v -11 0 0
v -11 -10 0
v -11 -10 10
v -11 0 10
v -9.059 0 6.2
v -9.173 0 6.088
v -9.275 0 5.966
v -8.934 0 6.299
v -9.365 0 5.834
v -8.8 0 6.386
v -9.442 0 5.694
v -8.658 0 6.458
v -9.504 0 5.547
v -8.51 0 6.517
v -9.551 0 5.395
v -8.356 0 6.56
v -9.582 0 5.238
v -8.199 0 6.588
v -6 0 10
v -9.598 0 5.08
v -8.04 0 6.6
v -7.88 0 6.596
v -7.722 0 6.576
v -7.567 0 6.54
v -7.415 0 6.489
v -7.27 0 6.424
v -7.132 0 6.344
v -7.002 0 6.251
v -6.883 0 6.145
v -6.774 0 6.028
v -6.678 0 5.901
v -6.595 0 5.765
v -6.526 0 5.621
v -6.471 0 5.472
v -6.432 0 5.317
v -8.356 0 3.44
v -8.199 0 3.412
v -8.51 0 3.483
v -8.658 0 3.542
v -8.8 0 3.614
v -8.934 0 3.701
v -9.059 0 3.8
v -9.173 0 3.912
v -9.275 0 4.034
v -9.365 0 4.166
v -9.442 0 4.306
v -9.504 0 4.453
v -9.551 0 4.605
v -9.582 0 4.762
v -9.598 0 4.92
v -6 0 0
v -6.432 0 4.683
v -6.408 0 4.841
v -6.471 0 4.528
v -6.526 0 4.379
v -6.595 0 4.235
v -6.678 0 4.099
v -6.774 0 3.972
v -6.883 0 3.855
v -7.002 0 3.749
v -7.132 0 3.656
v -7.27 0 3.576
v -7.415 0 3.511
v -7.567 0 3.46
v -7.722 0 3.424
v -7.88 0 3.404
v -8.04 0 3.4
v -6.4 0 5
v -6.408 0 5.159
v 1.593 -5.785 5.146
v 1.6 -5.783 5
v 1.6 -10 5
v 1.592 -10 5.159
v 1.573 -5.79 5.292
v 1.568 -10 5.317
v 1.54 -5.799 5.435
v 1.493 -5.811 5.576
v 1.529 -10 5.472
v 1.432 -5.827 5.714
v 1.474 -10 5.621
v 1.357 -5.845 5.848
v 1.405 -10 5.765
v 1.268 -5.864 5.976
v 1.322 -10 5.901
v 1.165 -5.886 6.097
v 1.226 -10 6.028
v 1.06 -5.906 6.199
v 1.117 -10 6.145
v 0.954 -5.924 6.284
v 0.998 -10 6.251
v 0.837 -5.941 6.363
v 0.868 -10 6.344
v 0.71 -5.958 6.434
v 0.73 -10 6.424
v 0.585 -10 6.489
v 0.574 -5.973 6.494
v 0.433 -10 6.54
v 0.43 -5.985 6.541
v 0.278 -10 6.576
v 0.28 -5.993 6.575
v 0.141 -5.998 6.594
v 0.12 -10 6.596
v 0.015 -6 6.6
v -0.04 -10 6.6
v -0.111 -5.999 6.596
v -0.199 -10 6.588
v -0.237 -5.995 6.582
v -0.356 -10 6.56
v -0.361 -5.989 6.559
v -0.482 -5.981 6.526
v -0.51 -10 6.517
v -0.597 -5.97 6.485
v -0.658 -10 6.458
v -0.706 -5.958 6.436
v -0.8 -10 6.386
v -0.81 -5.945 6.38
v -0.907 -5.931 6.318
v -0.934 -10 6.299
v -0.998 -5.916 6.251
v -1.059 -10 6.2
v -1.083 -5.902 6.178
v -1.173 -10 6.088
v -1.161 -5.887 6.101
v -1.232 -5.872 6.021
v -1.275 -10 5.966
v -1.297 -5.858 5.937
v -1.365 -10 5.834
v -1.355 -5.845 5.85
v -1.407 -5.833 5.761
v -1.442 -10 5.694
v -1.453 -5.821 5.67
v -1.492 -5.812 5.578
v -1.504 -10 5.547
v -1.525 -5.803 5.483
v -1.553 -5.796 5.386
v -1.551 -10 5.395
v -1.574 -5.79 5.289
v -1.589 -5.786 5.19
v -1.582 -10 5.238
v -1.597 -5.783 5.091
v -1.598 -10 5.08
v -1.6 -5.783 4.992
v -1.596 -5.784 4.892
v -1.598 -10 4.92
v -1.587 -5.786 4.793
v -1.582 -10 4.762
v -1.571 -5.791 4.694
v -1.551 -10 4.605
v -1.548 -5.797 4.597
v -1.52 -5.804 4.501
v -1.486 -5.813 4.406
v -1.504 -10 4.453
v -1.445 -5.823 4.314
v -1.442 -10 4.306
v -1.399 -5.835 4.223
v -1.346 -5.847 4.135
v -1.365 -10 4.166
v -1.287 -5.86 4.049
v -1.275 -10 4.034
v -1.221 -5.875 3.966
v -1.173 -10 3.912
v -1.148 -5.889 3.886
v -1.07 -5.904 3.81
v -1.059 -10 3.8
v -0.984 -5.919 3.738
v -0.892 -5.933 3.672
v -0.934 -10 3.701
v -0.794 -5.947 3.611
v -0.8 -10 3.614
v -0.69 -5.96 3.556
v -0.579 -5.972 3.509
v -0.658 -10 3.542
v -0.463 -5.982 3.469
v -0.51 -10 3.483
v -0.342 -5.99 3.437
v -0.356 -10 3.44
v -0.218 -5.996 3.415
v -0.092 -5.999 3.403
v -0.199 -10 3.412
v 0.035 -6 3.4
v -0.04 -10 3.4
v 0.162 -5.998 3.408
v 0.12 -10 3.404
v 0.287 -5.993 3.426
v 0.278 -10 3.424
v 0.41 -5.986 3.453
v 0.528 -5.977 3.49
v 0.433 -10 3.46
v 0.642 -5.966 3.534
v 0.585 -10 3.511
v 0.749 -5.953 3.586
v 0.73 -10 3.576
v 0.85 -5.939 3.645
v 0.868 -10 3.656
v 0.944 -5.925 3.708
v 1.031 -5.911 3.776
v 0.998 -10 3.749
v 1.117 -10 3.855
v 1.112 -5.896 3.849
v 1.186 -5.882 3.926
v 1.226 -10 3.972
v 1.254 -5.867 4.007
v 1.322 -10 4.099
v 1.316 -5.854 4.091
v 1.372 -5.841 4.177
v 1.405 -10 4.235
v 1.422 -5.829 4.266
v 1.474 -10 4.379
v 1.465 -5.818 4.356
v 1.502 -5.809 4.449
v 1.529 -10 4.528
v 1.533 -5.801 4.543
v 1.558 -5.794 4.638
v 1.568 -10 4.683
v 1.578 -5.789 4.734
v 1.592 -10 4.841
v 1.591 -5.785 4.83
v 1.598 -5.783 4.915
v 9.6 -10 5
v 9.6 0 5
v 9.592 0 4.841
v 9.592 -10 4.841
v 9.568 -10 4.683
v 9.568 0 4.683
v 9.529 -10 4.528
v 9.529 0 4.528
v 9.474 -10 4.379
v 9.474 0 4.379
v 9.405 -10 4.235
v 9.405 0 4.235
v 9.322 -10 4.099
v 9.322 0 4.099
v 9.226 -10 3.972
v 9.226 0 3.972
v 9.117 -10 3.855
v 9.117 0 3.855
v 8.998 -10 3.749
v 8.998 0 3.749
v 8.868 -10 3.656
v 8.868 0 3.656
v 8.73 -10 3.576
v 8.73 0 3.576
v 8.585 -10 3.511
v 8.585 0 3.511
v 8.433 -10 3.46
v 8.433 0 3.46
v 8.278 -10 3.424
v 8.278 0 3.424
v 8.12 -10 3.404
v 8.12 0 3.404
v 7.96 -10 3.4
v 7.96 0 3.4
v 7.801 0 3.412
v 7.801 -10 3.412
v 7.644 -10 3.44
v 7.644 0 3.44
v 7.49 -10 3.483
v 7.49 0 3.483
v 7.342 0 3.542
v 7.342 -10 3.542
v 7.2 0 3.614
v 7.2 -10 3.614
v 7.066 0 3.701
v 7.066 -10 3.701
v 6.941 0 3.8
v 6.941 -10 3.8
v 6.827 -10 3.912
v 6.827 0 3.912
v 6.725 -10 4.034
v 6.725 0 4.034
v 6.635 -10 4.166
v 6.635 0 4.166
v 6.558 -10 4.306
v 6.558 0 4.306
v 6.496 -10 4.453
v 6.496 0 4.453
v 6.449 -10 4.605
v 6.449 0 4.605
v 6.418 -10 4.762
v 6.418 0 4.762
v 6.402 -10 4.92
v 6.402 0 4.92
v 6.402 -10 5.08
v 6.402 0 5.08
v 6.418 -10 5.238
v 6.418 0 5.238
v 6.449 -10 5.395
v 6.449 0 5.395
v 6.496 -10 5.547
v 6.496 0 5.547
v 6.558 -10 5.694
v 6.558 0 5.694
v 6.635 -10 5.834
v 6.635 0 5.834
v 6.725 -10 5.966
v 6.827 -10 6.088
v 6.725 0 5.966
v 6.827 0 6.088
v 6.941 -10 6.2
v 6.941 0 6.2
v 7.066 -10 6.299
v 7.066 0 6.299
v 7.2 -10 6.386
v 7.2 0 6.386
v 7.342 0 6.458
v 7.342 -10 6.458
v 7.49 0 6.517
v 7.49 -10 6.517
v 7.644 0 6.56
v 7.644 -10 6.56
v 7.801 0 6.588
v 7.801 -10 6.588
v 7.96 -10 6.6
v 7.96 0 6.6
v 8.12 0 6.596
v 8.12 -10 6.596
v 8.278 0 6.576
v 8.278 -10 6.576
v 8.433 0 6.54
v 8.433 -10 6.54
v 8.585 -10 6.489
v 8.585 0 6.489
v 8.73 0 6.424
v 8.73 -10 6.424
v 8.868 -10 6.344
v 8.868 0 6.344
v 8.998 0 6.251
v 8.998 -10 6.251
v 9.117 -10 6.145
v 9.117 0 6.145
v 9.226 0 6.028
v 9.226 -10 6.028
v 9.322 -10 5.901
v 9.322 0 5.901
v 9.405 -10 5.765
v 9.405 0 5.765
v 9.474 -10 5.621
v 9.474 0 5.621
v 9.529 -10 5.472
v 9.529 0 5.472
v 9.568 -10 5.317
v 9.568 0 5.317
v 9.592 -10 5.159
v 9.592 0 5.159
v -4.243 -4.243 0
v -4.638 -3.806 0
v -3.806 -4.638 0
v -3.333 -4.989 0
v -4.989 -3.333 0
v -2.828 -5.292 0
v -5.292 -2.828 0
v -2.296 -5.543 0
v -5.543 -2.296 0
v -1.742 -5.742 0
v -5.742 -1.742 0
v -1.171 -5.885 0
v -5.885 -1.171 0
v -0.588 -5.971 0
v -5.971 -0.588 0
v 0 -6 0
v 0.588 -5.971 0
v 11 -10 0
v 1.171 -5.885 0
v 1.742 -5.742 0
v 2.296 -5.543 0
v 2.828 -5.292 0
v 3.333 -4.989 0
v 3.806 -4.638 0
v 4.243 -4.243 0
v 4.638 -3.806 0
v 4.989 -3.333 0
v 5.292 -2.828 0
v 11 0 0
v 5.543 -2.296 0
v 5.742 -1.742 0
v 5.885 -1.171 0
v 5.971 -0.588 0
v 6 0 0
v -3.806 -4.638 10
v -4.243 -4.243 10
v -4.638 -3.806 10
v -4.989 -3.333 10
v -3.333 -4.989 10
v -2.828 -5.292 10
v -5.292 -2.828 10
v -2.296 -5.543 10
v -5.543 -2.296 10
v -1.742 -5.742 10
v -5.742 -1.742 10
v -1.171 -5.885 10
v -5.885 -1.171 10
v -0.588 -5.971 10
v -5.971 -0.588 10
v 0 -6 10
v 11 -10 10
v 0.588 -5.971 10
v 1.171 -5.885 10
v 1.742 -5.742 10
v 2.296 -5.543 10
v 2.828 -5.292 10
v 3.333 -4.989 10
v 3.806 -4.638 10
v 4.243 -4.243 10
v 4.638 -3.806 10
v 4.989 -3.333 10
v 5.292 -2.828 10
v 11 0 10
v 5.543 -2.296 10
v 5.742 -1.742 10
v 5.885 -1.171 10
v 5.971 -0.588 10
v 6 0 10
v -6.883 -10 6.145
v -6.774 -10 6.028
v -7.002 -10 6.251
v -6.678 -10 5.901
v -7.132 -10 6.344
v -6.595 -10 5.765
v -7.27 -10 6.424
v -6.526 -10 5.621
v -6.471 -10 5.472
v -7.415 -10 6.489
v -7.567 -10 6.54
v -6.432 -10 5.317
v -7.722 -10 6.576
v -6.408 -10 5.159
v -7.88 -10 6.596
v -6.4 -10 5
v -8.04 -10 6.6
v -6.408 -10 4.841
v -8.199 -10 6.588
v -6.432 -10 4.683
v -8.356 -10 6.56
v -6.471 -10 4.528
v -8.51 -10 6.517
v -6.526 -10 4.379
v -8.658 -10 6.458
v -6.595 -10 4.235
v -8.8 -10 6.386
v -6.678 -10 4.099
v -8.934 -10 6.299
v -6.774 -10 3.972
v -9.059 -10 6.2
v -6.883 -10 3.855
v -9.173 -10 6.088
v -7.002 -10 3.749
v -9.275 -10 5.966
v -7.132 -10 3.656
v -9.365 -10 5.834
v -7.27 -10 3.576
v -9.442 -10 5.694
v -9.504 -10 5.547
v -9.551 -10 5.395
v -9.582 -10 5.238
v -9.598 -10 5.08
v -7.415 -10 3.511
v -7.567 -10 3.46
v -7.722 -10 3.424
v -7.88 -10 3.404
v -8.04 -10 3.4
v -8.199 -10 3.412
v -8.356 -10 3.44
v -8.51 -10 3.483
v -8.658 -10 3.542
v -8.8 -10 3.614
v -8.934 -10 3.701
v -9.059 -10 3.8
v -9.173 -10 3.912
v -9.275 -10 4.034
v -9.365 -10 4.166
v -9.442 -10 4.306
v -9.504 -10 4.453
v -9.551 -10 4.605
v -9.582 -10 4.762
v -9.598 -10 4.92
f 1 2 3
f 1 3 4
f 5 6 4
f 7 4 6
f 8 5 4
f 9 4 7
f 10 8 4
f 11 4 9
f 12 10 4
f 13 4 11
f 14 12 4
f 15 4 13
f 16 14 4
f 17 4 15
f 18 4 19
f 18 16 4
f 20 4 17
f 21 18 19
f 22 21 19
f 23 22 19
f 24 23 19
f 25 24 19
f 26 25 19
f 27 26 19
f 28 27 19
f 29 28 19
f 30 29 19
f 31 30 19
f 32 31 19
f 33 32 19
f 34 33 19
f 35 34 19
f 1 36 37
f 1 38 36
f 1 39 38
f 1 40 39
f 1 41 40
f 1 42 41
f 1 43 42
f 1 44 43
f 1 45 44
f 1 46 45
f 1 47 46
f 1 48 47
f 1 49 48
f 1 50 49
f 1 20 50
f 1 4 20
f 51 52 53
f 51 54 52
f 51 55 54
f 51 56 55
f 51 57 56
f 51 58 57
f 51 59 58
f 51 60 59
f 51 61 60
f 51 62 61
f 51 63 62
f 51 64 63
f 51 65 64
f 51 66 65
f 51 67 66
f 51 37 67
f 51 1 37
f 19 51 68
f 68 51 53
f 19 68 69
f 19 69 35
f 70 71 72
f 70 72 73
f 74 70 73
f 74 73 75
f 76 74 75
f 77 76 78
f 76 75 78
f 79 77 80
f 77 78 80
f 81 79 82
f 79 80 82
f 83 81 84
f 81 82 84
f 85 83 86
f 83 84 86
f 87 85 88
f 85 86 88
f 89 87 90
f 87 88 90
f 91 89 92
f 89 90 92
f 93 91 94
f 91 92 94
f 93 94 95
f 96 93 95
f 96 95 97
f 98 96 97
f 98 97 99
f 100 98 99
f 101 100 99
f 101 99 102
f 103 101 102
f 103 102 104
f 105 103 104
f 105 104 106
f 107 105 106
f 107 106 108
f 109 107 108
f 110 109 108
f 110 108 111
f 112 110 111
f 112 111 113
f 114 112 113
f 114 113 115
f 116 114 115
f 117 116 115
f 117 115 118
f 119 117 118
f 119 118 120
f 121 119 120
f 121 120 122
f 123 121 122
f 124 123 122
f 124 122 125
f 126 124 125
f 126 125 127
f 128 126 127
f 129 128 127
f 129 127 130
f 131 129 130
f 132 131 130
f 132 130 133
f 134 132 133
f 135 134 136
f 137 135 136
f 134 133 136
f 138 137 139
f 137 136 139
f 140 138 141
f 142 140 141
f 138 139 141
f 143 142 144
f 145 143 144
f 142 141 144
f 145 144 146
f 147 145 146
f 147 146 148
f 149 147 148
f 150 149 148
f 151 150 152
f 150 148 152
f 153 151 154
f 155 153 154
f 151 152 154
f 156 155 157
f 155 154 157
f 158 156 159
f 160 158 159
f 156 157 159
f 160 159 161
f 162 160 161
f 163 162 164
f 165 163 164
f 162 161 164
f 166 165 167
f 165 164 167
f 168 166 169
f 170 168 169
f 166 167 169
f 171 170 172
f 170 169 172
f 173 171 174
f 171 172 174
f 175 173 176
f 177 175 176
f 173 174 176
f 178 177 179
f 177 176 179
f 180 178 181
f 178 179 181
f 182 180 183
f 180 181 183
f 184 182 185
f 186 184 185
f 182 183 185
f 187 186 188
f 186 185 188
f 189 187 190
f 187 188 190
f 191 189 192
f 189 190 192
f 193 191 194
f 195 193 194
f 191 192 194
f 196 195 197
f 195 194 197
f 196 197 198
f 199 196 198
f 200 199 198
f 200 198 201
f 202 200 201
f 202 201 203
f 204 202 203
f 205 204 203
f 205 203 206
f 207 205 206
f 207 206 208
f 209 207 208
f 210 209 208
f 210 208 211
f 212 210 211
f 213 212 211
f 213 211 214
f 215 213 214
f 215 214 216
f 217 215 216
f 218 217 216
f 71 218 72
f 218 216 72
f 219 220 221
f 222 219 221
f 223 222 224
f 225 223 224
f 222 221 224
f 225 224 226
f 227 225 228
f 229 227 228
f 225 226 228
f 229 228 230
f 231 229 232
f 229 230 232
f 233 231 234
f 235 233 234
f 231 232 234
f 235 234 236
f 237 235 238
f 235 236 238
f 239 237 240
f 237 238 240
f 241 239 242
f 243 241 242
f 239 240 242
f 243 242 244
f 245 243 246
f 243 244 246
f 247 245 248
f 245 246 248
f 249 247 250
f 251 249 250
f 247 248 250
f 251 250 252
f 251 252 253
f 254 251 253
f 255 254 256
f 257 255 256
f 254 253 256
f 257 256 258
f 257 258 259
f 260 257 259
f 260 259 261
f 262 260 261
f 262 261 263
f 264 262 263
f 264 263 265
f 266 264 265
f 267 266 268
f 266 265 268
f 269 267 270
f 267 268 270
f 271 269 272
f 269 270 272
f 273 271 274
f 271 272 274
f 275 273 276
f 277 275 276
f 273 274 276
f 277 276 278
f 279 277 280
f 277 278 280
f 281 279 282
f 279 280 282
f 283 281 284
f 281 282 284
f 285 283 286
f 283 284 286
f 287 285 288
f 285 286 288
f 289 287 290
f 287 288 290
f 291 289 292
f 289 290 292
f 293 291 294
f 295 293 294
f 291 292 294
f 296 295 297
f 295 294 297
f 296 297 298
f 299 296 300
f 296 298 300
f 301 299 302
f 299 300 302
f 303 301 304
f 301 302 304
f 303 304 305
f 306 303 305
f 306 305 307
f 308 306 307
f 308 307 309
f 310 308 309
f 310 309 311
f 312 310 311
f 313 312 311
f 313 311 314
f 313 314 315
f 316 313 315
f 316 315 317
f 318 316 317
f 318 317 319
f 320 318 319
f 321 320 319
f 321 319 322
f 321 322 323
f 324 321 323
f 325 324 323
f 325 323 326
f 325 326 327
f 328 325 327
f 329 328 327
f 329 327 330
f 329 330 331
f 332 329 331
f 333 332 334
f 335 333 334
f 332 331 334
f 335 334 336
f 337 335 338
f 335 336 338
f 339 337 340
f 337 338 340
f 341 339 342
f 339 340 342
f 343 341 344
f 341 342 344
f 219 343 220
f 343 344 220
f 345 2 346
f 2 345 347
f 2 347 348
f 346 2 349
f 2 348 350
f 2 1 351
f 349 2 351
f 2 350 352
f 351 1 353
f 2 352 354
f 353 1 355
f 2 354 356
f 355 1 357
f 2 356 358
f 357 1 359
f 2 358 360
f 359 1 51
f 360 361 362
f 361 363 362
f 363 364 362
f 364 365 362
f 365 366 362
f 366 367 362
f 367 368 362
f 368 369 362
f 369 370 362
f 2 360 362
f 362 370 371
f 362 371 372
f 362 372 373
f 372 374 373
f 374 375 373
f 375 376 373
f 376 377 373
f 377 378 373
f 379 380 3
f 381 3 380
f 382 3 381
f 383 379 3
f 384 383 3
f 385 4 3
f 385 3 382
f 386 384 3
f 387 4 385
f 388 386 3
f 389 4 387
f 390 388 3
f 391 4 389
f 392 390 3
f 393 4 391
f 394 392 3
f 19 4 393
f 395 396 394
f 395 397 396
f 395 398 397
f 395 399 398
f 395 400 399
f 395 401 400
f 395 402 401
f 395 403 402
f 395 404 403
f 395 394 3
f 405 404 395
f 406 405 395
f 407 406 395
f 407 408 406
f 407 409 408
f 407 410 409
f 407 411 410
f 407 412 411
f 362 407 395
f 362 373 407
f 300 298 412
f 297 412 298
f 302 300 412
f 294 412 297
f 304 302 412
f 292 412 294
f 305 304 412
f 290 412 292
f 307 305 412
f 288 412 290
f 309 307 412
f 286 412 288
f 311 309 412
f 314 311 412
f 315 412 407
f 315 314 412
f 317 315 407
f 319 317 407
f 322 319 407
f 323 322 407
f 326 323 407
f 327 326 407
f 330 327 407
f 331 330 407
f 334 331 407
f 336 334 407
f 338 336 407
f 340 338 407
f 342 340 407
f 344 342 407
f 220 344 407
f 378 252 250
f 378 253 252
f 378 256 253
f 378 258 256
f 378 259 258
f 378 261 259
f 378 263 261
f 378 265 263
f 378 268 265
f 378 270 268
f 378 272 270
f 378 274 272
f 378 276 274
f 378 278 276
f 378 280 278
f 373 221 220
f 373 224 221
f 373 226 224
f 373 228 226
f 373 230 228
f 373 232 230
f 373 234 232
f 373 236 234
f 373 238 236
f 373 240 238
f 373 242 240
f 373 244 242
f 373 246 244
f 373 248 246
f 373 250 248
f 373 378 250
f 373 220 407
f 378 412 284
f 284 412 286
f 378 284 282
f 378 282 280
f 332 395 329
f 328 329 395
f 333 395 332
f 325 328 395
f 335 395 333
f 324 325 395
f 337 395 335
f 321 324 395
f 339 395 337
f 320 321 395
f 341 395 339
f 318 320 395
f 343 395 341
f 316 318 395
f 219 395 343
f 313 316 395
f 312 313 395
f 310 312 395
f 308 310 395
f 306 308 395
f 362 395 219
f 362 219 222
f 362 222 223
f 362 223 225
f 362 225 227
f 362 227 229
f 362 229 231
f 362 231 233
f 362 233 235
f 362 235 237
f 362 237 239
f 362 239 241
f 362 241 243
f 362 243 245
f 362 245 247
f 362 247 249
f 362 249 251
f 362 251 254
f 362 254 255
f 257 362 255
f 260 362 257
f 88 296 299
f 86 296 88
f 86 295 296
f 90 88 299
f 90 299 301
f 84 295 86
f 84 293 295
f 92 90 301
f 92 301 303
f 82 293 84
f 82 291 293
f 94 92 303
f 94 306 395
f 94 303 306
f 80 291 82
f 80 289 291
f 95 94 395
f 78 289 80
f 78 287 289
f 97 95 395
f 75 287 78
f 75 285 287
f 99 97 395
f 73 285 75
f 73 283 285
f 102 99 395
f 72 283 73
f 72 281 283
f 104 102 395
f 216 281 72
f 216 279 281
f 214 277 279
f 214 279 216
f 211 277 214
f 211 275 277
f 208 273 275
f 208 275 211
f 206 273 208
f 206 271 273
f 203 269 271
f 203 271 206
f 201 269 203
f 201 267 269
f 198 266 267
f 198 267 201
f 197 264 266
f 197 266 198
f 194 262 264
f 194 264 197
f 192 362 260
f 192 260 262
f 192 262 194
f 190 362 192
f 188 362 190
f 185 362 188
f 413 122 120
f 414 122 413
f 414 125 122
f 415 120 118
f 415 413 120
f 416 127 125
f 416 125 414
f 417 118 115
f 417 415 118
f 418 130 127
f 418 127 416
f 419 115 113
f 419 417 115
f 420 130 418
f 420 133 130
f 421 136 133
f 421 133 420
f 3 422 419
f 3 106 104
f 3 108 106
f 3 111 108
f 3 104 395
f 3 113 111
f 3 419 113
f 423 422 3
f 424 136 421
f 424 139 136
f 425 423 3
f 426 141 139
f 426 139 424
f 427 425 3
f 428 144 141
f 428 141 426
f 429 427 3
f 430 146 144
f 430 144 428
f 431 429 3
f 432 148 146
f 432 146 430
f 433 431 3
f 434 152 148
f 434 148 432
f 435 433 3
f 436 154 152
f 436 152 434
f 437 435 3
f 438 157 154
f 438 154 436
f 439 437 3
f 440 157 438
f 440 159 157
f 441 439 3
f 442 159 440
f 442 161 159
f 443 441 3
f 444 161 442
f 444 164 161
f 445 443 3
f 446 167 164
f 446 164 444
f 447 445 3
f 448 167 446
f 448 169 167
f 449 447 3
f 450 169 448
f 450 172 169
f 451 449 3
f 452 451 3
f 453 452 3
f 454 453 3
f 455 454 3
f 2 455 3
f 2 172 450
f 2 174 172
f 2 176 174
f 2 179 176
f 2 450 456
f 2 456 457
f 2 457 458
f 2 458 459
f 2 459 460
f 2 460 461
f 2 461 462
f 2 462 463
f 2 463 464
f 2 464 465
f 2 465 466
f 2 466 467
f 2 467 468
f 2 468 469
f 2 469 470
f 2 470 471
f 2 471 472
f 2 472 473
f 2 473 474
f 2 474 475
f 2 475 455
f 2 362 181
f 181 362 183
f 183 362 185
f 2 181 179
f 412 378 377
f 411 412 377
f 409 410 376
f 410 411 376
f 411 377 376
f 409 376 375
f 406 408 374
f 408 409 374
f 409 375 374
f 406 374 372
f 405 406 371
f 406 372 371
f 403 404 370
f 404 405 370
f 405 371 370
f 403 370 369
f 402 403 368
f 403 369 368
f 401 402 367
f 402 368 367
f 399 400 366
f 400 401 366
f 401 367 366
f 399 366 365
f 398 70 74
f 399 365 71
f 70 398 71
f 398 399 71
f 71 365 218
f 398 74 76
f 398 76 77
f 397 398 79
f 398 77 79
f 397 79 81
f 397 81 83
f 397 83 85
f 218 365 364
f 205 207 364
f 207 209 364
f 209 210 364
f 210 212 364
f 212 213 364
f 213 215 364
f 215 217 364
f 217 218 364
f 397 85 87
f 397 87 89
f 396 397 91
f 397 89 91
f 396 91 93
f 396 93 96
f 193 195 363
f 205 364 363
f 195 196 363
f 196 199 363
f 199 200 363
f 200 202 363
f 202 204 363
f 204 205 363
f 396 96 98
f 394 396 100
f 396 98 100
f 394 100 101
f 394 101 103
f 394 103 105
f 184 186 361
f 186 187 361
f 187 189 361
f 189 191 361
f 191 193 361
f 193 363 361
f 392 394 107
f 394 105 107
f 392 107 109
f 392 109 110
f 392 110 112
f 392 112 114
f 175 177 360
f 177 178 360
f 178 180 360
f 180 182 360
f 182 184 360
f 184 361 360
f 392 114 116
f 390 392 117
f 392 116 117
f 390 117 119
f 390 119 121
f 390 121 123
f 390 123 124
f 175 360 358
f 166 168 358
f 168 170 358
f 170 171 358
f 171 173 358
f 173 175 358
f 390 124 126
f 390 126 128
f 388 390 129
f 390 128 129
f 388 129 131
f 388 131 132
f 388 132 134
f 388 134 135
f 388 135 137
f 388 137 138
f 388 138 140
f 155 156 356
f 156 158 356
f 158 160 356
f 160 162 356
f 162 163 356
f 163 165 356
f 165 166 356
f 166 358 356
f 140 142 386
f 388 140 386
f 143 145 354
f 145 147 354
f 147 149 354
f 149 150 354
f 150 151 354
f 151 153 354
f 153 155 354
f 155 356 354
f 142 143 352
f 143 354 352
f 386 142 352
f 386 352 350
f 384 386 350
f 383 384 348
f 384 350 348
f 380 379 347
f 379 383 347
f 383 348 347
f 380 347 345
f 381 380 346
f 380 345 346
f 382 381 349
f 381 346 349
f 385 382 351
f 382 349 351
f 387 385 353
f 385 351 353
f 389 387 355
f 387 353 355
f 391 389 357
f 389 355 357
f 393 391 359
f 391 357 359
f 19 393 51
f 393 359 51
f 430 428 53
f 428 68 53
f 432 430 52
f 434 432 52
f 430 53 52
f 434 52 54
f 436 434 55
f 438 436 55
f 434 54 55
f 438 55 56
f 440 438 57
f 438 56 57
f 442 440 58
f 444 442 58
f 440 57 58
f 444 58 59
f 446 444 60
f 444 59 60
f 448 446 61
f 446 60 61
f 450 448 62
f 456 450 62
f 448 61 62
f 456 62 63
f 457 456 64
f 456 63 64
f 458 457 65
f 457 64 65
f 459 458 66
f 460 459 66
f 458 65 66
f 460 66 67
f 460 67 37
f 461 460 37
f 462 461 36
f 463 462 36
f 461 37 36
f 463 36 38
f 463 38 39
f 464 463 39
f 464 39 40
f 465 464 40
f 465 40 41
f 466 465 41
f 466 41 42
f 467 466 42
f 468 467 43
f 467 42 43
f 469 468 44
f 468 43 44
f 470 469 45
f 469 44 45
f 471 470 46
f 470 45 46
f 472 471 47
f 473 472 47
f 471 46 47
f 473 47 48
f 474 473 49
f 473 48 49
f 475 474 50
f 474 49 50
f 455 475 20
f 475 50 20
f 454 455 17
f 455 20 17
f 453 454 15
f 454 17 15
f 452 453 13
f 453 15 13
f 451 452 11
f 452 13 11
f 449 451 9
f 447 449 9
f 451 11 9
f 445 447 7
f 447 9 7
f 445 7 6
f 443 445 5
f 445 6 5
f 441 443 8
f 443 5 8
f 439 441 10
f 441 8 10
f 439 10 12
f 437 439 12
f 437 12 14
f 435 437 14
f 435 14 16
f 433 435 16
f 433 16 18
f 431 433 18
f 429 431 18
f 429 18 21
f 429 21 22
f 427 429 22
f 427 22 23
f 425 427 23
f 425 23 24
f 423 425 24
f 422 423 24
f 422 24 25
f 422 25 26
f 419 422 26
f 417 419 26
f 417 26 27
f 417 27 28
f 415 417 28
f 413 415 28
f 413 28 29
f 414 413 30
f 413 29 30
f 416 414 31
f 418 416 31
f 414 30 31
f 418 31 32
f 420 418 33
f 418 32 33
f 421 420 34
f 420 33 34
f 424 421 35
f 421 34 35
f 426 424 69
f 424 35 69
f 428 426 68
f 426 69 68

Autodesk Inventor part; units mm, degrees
ref_plane "YZ Plane" through (0, 0, 0) normal (1, 0, 0) x (0, 1, 0)
ref_plane "XZ Plane" through (0, 0, 0) normal (0, 1, 0) x (-1, 0, 0)
ref_plane "XY Plane" through (0, 0, 0) normal (0, 0, 1) x (1, 0, 0)
sketch "Sketch2" plane through (0, 0, 0) normal (0, 0, 1) x (1, 0, 0)
  circle A0 centre (0, 0) radius 6
  line L0 (-11, 0) -> (11, 0)
  line L1 (11, 0) -> (11, -10)
  line L2 (11, -10) -> (-11, -10)
  line L3 (-11, -10) -> (-11, 0)
  circle A1 centre (0, 0) radius 9
  point P0 (6, 0)
  point P1 (-6, 0)
  dimension "d0" = 12
  dimension "d1" = 11
  dimension "d2" = 11
  dimension "d3" = 10
  dimension "d4" = 3
extrude "Extrusion1" add sketch "Sketch2" along normal blind 10 contours L0 A1 A0 | L0 L1 L2 L3 A1 picked at (-7.9128, -0.7179)
sketch "Sketch3" plane through (6, 0, 0) normal (0, 1, 0) x (1, 0, 0)
  circle A0 centre (2, -5) radius 1.6
  line L0 (5, 0) -> (5, -10) projected
  line L1 (5, 0) -> (0, 0) projected
  circle A1 centre (-14, -5) radius 1.6
  line L2 (-17, 0) -> (-17, -10) projected
  line L3 (-12, 0) -> (-17, 0) projected
  point P0 (-6, 0)
  dimension "d7" = 3.2
  dimension "d8" = 3
  dimension "d9" = 5
  dimension "d10" = 3.2
  dimension "d11" = 3
  dimension "d12" = 5
extrude "Extrusion2" cut sketch "Sketch3" against normal blind 10
sketch "Sketch4" plane through (-11, -10, 0) normal (0, -1, 0) x (1, 0, 0)
  circle A0 centre (11, 5) radius 1.6
  line L0 (0, 0) -> (22, 0) projected
  point P0 (11, 0)
  dimension "d15" = 3.2
  dimension "d16" = 5
extrude "Extrusion3" cut sketch "Sketch4" against normal blind 10
equation "\"d2\" = d1"
properties part number "Tube_mount_centering"
